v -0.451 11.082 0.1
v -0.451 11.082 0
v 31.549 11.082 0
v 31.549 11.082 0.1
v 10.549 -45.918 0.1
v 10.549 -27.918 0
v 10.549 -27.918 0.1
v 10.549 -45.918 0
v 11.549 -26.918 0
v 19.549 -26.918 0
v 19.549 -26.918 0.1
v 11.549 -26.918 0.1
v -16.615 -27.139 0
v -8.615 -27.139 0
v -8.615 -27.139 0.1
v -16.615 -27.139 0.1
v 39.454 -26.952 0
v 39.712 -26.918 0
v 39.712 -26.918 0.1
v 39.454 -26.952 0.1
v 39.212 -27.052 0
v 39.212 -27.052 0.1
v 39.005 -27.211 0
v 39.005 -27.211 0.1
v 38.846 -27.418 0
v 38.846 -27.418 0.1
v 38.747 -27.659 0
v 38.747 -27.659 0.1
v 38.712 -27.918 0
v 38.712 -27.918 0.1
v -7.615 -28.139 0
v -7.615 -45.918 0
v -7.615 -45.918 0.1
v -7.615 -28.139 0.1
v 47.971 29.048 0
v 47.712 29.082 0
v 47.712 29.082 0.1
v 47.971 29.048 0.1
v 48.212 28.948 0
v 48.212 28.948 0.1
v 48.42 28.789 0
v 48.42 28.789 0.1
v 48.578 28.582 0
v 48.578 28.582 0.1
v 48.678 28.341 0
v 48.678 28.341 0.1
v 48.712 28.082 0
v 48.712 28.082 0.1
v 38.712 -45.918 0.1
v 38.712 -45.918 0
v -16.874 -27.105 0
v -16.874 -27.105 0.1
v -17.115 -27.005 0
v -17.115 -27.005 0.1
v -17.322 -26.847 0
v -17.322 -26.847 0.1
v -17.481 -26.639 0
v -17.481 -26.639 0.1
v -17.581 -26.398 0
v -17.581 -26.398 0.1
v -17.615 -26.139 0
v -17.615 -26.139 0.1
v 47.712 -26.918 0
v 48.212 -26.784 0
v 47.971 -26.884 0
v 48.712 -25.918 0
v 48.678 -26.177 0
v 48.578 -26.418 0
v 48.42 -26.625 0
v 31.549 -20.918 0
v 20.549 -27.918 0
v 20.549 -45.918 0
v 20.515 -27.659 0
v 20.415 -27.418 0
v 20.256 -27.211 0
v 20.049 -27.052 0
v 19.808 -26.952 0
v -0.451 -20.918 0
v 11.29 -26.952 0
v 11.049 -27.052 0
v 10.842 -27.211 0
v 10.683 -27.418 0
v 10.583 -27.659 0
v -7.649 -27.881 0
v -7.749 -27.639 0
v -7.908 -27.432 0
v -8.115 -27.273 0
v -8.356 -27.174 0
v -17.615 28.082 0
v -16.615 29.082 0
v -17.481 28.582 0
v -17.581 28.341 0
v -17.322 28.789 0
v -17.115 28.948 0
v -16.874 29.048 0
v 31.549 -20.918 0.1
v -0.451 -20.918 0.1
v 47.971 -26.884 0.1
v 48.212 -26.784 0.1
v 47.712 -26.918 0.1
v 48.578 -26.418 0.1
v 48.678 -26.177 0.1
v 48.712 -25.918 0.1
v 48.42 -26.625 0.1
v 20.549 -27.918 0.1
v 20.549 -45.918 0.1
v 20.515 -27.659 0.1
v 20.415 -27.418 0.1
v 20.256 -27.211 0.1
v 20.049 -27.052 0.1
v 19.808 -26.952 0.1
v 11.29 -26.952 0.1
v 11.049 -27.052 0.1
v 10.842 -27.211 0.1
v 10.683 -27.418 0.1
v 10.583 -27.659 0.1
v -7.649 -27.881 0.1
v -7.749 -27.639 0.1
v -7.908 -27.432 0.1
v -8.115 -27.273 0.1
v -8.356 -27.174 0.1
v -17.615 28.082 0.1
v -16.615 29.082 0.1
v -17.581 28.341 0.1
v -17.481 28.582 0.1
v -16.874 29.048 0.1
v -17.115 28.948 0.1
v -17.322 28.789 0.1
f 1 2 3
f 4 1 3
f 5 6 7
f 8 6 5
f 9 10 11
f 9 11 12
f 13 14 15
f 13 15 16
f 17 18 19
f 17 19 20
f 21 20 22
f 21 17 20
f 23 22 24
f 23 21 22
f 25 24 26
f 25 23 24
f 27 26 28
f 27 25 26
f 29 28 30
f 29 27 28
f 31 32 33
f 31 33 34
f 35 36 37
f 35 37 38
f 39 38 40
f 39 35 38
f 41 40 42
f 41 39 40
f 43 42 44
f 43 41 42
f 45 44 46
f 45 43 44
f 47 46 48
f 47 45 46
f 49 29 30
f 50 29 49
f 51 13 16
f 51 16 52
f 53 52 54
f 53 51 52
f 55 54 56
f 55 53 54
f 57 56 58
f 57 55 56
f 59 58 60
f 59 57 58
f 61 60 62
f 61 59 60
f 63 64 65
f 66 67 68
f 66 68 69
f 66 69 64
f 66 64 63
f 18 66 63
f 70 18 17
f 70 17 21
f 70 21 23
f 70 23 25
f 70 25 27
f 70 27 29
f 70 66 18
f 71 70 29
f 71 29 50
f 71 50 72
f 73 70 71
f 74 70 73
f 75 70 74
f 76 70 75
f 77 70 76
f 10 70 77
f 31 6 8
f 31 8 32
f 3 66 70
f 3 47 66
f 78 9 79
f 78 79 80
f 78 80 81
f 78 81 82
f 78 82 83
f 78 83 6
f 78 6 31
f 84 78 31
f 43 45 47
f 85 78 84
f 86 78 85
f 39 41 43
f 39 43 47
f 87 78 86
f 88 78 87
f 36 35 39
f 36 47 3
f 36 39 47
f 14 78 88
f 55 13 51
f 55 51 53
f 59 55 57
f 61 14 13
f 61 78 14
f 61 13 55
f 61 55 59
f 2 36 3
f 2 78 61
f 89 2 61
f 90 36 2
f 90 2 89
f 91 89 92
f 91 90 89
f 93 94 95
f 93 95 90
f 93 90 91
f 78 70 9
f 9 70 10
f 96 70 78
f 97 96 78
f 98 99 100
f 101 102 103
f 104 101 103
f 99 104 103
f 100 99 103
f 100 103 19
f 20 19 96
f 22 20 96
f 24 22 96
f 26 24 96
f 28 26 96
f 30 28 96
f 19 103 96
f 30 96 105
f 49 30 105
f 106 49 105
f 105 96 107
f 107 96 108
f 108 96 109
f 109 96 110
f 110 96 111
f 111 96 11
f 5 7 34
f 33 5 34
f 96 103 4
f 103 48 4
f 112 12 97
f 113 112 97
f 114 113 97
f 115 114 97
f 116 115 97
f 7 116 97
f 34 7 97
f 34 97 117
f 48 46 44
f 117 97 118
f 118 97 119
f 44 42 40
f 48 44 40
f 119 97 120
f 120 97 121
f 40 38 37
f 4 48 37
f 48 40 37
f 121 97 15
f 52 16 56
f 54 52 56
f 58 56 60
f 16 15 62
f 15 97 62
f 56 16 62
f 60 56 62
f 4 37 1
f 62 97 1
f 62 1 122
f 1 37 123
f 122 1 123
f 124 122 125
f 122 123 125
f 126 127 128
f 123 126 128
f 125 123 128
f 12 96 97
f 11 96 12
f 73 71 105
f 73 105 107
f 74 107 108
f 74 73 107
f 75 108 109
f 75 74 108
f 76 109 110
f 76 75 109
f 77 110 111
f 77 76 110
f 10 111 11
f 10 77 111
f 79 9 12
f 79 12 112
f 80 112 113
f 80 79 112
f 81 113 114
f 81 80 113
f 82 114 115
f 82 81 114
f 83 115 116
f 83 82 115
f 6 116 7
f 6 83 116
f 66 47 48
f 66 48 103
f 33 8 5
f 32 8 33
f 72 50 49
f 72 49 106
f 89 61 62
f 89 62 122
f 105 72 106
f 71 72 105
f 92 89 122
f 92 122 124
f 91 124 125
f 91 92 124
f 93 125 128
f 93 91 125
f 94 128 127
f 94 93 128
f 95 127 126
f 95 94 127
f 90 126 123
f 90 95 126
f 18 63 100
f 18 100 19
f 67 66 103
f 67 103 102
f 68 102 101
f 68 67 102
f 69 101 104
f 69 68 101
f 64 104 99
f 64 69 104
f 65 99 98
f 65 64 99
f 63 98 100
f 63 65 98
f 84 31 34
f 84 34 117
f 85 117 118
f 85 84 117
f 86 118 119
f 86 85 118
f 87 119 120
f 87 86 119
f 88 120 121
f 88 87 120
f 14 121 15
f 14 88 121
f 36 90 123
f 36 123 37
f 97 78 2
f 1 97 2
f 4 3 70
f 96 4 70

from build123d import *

# Parameters (mm, degrees)
SALIENTE_EXTRUIR1_DEPTH = 0.1


with BuildPart() as part:
    # Model → Saliente-Extruir1 (new body)
    with BuildSketch(Plane.XY):
        with BuildLine():
            Line((34.712434383, 29.082277171), (47.712434383, 29.082277171))
            ThreePointArc((47.712434383, 29.082277171), (48.419541165, 28.789383952), (48.712434383, 28.082277171))
            Line((48.712434383, 28.082277171), (48.712434383, -25.917722829))
            ThreePointArc((48.712434383, -25.917722829), (48.419541165, -26.62482961), (47.712434383, -26.917722829))
            Line((47.712434383, -26.917722829), (39.712434383, -26.917722829))
            ThreePointArc((39.712434383, -26.917722829), (39.005327602, -27.210616048), (38.712434383, -27.917722829))
            Line((38.712434383, -27.917722829), (38.712434383, -45.917722829))
            Line((38.712434383, -45.917722829), (20.548823016, -45.917722829))
            Line((20.548823016, -45.917722829), (20.548823016, -27.917722829))
            ThreePointArc((20.548823016, -27.917722829), (20.255929797, -27.210616048), (19.548823016, -26.917722829))
            Line((19.548823016, -26.917722829), (11.548823016, -26.917722829))
            ThreePointArc((11.548823016, -26.917722829), (10.841716234, -27.210616048), (10.548823016, -27.917722829))
            Line((10.548823016, -27.917722829), (10.548823016, -45.917722829))
            Line((10.548823016, -45.917722829), (-7.614788352, -45.917722829))
            Line((-7.614788352, -45.917722829), (-7.614788352, -28.139448744))
            ThreePointArc((-7.614788352, -28.139448744), (-7.907681571, -27.432341963), (-8.614788352, -27.139448744))
            Line((-8.614788352, -27.139448744), (-16.614788352, -27.139448744))
            ThreePointArc((-16.614788352, -27.139448744), (-17.321895133, -26.846555525), (-17.614788352, -26.139448744))
            Line((-17.614788352, -26.139448744), (-17.614788352, 28.082277171))
            ThreePointArc((-17.614788352, 28.082277171), (-17.321895133, 28.789383952), (-16.614788352, 29.082277171))
            Line((-16.614788352, 29.082277171), (-3.614788352, 29.082277171))
            Line((-3.614788352, 29.082277171), (34.712434383, 29.082277171))
        make_face()
        Polygon((31.548823016, 11.082277171), (31.548823016, -20.917722829), (-0.451176984, -20.917722829), (-0.451176984, 11.082277171), (16.048823016, 11.082277171), align=None, mode=Mode.SUBTRACT)
    extrude(amount=SALIENTE_EXTRUIR1_DEPTH)


solid = part.part
